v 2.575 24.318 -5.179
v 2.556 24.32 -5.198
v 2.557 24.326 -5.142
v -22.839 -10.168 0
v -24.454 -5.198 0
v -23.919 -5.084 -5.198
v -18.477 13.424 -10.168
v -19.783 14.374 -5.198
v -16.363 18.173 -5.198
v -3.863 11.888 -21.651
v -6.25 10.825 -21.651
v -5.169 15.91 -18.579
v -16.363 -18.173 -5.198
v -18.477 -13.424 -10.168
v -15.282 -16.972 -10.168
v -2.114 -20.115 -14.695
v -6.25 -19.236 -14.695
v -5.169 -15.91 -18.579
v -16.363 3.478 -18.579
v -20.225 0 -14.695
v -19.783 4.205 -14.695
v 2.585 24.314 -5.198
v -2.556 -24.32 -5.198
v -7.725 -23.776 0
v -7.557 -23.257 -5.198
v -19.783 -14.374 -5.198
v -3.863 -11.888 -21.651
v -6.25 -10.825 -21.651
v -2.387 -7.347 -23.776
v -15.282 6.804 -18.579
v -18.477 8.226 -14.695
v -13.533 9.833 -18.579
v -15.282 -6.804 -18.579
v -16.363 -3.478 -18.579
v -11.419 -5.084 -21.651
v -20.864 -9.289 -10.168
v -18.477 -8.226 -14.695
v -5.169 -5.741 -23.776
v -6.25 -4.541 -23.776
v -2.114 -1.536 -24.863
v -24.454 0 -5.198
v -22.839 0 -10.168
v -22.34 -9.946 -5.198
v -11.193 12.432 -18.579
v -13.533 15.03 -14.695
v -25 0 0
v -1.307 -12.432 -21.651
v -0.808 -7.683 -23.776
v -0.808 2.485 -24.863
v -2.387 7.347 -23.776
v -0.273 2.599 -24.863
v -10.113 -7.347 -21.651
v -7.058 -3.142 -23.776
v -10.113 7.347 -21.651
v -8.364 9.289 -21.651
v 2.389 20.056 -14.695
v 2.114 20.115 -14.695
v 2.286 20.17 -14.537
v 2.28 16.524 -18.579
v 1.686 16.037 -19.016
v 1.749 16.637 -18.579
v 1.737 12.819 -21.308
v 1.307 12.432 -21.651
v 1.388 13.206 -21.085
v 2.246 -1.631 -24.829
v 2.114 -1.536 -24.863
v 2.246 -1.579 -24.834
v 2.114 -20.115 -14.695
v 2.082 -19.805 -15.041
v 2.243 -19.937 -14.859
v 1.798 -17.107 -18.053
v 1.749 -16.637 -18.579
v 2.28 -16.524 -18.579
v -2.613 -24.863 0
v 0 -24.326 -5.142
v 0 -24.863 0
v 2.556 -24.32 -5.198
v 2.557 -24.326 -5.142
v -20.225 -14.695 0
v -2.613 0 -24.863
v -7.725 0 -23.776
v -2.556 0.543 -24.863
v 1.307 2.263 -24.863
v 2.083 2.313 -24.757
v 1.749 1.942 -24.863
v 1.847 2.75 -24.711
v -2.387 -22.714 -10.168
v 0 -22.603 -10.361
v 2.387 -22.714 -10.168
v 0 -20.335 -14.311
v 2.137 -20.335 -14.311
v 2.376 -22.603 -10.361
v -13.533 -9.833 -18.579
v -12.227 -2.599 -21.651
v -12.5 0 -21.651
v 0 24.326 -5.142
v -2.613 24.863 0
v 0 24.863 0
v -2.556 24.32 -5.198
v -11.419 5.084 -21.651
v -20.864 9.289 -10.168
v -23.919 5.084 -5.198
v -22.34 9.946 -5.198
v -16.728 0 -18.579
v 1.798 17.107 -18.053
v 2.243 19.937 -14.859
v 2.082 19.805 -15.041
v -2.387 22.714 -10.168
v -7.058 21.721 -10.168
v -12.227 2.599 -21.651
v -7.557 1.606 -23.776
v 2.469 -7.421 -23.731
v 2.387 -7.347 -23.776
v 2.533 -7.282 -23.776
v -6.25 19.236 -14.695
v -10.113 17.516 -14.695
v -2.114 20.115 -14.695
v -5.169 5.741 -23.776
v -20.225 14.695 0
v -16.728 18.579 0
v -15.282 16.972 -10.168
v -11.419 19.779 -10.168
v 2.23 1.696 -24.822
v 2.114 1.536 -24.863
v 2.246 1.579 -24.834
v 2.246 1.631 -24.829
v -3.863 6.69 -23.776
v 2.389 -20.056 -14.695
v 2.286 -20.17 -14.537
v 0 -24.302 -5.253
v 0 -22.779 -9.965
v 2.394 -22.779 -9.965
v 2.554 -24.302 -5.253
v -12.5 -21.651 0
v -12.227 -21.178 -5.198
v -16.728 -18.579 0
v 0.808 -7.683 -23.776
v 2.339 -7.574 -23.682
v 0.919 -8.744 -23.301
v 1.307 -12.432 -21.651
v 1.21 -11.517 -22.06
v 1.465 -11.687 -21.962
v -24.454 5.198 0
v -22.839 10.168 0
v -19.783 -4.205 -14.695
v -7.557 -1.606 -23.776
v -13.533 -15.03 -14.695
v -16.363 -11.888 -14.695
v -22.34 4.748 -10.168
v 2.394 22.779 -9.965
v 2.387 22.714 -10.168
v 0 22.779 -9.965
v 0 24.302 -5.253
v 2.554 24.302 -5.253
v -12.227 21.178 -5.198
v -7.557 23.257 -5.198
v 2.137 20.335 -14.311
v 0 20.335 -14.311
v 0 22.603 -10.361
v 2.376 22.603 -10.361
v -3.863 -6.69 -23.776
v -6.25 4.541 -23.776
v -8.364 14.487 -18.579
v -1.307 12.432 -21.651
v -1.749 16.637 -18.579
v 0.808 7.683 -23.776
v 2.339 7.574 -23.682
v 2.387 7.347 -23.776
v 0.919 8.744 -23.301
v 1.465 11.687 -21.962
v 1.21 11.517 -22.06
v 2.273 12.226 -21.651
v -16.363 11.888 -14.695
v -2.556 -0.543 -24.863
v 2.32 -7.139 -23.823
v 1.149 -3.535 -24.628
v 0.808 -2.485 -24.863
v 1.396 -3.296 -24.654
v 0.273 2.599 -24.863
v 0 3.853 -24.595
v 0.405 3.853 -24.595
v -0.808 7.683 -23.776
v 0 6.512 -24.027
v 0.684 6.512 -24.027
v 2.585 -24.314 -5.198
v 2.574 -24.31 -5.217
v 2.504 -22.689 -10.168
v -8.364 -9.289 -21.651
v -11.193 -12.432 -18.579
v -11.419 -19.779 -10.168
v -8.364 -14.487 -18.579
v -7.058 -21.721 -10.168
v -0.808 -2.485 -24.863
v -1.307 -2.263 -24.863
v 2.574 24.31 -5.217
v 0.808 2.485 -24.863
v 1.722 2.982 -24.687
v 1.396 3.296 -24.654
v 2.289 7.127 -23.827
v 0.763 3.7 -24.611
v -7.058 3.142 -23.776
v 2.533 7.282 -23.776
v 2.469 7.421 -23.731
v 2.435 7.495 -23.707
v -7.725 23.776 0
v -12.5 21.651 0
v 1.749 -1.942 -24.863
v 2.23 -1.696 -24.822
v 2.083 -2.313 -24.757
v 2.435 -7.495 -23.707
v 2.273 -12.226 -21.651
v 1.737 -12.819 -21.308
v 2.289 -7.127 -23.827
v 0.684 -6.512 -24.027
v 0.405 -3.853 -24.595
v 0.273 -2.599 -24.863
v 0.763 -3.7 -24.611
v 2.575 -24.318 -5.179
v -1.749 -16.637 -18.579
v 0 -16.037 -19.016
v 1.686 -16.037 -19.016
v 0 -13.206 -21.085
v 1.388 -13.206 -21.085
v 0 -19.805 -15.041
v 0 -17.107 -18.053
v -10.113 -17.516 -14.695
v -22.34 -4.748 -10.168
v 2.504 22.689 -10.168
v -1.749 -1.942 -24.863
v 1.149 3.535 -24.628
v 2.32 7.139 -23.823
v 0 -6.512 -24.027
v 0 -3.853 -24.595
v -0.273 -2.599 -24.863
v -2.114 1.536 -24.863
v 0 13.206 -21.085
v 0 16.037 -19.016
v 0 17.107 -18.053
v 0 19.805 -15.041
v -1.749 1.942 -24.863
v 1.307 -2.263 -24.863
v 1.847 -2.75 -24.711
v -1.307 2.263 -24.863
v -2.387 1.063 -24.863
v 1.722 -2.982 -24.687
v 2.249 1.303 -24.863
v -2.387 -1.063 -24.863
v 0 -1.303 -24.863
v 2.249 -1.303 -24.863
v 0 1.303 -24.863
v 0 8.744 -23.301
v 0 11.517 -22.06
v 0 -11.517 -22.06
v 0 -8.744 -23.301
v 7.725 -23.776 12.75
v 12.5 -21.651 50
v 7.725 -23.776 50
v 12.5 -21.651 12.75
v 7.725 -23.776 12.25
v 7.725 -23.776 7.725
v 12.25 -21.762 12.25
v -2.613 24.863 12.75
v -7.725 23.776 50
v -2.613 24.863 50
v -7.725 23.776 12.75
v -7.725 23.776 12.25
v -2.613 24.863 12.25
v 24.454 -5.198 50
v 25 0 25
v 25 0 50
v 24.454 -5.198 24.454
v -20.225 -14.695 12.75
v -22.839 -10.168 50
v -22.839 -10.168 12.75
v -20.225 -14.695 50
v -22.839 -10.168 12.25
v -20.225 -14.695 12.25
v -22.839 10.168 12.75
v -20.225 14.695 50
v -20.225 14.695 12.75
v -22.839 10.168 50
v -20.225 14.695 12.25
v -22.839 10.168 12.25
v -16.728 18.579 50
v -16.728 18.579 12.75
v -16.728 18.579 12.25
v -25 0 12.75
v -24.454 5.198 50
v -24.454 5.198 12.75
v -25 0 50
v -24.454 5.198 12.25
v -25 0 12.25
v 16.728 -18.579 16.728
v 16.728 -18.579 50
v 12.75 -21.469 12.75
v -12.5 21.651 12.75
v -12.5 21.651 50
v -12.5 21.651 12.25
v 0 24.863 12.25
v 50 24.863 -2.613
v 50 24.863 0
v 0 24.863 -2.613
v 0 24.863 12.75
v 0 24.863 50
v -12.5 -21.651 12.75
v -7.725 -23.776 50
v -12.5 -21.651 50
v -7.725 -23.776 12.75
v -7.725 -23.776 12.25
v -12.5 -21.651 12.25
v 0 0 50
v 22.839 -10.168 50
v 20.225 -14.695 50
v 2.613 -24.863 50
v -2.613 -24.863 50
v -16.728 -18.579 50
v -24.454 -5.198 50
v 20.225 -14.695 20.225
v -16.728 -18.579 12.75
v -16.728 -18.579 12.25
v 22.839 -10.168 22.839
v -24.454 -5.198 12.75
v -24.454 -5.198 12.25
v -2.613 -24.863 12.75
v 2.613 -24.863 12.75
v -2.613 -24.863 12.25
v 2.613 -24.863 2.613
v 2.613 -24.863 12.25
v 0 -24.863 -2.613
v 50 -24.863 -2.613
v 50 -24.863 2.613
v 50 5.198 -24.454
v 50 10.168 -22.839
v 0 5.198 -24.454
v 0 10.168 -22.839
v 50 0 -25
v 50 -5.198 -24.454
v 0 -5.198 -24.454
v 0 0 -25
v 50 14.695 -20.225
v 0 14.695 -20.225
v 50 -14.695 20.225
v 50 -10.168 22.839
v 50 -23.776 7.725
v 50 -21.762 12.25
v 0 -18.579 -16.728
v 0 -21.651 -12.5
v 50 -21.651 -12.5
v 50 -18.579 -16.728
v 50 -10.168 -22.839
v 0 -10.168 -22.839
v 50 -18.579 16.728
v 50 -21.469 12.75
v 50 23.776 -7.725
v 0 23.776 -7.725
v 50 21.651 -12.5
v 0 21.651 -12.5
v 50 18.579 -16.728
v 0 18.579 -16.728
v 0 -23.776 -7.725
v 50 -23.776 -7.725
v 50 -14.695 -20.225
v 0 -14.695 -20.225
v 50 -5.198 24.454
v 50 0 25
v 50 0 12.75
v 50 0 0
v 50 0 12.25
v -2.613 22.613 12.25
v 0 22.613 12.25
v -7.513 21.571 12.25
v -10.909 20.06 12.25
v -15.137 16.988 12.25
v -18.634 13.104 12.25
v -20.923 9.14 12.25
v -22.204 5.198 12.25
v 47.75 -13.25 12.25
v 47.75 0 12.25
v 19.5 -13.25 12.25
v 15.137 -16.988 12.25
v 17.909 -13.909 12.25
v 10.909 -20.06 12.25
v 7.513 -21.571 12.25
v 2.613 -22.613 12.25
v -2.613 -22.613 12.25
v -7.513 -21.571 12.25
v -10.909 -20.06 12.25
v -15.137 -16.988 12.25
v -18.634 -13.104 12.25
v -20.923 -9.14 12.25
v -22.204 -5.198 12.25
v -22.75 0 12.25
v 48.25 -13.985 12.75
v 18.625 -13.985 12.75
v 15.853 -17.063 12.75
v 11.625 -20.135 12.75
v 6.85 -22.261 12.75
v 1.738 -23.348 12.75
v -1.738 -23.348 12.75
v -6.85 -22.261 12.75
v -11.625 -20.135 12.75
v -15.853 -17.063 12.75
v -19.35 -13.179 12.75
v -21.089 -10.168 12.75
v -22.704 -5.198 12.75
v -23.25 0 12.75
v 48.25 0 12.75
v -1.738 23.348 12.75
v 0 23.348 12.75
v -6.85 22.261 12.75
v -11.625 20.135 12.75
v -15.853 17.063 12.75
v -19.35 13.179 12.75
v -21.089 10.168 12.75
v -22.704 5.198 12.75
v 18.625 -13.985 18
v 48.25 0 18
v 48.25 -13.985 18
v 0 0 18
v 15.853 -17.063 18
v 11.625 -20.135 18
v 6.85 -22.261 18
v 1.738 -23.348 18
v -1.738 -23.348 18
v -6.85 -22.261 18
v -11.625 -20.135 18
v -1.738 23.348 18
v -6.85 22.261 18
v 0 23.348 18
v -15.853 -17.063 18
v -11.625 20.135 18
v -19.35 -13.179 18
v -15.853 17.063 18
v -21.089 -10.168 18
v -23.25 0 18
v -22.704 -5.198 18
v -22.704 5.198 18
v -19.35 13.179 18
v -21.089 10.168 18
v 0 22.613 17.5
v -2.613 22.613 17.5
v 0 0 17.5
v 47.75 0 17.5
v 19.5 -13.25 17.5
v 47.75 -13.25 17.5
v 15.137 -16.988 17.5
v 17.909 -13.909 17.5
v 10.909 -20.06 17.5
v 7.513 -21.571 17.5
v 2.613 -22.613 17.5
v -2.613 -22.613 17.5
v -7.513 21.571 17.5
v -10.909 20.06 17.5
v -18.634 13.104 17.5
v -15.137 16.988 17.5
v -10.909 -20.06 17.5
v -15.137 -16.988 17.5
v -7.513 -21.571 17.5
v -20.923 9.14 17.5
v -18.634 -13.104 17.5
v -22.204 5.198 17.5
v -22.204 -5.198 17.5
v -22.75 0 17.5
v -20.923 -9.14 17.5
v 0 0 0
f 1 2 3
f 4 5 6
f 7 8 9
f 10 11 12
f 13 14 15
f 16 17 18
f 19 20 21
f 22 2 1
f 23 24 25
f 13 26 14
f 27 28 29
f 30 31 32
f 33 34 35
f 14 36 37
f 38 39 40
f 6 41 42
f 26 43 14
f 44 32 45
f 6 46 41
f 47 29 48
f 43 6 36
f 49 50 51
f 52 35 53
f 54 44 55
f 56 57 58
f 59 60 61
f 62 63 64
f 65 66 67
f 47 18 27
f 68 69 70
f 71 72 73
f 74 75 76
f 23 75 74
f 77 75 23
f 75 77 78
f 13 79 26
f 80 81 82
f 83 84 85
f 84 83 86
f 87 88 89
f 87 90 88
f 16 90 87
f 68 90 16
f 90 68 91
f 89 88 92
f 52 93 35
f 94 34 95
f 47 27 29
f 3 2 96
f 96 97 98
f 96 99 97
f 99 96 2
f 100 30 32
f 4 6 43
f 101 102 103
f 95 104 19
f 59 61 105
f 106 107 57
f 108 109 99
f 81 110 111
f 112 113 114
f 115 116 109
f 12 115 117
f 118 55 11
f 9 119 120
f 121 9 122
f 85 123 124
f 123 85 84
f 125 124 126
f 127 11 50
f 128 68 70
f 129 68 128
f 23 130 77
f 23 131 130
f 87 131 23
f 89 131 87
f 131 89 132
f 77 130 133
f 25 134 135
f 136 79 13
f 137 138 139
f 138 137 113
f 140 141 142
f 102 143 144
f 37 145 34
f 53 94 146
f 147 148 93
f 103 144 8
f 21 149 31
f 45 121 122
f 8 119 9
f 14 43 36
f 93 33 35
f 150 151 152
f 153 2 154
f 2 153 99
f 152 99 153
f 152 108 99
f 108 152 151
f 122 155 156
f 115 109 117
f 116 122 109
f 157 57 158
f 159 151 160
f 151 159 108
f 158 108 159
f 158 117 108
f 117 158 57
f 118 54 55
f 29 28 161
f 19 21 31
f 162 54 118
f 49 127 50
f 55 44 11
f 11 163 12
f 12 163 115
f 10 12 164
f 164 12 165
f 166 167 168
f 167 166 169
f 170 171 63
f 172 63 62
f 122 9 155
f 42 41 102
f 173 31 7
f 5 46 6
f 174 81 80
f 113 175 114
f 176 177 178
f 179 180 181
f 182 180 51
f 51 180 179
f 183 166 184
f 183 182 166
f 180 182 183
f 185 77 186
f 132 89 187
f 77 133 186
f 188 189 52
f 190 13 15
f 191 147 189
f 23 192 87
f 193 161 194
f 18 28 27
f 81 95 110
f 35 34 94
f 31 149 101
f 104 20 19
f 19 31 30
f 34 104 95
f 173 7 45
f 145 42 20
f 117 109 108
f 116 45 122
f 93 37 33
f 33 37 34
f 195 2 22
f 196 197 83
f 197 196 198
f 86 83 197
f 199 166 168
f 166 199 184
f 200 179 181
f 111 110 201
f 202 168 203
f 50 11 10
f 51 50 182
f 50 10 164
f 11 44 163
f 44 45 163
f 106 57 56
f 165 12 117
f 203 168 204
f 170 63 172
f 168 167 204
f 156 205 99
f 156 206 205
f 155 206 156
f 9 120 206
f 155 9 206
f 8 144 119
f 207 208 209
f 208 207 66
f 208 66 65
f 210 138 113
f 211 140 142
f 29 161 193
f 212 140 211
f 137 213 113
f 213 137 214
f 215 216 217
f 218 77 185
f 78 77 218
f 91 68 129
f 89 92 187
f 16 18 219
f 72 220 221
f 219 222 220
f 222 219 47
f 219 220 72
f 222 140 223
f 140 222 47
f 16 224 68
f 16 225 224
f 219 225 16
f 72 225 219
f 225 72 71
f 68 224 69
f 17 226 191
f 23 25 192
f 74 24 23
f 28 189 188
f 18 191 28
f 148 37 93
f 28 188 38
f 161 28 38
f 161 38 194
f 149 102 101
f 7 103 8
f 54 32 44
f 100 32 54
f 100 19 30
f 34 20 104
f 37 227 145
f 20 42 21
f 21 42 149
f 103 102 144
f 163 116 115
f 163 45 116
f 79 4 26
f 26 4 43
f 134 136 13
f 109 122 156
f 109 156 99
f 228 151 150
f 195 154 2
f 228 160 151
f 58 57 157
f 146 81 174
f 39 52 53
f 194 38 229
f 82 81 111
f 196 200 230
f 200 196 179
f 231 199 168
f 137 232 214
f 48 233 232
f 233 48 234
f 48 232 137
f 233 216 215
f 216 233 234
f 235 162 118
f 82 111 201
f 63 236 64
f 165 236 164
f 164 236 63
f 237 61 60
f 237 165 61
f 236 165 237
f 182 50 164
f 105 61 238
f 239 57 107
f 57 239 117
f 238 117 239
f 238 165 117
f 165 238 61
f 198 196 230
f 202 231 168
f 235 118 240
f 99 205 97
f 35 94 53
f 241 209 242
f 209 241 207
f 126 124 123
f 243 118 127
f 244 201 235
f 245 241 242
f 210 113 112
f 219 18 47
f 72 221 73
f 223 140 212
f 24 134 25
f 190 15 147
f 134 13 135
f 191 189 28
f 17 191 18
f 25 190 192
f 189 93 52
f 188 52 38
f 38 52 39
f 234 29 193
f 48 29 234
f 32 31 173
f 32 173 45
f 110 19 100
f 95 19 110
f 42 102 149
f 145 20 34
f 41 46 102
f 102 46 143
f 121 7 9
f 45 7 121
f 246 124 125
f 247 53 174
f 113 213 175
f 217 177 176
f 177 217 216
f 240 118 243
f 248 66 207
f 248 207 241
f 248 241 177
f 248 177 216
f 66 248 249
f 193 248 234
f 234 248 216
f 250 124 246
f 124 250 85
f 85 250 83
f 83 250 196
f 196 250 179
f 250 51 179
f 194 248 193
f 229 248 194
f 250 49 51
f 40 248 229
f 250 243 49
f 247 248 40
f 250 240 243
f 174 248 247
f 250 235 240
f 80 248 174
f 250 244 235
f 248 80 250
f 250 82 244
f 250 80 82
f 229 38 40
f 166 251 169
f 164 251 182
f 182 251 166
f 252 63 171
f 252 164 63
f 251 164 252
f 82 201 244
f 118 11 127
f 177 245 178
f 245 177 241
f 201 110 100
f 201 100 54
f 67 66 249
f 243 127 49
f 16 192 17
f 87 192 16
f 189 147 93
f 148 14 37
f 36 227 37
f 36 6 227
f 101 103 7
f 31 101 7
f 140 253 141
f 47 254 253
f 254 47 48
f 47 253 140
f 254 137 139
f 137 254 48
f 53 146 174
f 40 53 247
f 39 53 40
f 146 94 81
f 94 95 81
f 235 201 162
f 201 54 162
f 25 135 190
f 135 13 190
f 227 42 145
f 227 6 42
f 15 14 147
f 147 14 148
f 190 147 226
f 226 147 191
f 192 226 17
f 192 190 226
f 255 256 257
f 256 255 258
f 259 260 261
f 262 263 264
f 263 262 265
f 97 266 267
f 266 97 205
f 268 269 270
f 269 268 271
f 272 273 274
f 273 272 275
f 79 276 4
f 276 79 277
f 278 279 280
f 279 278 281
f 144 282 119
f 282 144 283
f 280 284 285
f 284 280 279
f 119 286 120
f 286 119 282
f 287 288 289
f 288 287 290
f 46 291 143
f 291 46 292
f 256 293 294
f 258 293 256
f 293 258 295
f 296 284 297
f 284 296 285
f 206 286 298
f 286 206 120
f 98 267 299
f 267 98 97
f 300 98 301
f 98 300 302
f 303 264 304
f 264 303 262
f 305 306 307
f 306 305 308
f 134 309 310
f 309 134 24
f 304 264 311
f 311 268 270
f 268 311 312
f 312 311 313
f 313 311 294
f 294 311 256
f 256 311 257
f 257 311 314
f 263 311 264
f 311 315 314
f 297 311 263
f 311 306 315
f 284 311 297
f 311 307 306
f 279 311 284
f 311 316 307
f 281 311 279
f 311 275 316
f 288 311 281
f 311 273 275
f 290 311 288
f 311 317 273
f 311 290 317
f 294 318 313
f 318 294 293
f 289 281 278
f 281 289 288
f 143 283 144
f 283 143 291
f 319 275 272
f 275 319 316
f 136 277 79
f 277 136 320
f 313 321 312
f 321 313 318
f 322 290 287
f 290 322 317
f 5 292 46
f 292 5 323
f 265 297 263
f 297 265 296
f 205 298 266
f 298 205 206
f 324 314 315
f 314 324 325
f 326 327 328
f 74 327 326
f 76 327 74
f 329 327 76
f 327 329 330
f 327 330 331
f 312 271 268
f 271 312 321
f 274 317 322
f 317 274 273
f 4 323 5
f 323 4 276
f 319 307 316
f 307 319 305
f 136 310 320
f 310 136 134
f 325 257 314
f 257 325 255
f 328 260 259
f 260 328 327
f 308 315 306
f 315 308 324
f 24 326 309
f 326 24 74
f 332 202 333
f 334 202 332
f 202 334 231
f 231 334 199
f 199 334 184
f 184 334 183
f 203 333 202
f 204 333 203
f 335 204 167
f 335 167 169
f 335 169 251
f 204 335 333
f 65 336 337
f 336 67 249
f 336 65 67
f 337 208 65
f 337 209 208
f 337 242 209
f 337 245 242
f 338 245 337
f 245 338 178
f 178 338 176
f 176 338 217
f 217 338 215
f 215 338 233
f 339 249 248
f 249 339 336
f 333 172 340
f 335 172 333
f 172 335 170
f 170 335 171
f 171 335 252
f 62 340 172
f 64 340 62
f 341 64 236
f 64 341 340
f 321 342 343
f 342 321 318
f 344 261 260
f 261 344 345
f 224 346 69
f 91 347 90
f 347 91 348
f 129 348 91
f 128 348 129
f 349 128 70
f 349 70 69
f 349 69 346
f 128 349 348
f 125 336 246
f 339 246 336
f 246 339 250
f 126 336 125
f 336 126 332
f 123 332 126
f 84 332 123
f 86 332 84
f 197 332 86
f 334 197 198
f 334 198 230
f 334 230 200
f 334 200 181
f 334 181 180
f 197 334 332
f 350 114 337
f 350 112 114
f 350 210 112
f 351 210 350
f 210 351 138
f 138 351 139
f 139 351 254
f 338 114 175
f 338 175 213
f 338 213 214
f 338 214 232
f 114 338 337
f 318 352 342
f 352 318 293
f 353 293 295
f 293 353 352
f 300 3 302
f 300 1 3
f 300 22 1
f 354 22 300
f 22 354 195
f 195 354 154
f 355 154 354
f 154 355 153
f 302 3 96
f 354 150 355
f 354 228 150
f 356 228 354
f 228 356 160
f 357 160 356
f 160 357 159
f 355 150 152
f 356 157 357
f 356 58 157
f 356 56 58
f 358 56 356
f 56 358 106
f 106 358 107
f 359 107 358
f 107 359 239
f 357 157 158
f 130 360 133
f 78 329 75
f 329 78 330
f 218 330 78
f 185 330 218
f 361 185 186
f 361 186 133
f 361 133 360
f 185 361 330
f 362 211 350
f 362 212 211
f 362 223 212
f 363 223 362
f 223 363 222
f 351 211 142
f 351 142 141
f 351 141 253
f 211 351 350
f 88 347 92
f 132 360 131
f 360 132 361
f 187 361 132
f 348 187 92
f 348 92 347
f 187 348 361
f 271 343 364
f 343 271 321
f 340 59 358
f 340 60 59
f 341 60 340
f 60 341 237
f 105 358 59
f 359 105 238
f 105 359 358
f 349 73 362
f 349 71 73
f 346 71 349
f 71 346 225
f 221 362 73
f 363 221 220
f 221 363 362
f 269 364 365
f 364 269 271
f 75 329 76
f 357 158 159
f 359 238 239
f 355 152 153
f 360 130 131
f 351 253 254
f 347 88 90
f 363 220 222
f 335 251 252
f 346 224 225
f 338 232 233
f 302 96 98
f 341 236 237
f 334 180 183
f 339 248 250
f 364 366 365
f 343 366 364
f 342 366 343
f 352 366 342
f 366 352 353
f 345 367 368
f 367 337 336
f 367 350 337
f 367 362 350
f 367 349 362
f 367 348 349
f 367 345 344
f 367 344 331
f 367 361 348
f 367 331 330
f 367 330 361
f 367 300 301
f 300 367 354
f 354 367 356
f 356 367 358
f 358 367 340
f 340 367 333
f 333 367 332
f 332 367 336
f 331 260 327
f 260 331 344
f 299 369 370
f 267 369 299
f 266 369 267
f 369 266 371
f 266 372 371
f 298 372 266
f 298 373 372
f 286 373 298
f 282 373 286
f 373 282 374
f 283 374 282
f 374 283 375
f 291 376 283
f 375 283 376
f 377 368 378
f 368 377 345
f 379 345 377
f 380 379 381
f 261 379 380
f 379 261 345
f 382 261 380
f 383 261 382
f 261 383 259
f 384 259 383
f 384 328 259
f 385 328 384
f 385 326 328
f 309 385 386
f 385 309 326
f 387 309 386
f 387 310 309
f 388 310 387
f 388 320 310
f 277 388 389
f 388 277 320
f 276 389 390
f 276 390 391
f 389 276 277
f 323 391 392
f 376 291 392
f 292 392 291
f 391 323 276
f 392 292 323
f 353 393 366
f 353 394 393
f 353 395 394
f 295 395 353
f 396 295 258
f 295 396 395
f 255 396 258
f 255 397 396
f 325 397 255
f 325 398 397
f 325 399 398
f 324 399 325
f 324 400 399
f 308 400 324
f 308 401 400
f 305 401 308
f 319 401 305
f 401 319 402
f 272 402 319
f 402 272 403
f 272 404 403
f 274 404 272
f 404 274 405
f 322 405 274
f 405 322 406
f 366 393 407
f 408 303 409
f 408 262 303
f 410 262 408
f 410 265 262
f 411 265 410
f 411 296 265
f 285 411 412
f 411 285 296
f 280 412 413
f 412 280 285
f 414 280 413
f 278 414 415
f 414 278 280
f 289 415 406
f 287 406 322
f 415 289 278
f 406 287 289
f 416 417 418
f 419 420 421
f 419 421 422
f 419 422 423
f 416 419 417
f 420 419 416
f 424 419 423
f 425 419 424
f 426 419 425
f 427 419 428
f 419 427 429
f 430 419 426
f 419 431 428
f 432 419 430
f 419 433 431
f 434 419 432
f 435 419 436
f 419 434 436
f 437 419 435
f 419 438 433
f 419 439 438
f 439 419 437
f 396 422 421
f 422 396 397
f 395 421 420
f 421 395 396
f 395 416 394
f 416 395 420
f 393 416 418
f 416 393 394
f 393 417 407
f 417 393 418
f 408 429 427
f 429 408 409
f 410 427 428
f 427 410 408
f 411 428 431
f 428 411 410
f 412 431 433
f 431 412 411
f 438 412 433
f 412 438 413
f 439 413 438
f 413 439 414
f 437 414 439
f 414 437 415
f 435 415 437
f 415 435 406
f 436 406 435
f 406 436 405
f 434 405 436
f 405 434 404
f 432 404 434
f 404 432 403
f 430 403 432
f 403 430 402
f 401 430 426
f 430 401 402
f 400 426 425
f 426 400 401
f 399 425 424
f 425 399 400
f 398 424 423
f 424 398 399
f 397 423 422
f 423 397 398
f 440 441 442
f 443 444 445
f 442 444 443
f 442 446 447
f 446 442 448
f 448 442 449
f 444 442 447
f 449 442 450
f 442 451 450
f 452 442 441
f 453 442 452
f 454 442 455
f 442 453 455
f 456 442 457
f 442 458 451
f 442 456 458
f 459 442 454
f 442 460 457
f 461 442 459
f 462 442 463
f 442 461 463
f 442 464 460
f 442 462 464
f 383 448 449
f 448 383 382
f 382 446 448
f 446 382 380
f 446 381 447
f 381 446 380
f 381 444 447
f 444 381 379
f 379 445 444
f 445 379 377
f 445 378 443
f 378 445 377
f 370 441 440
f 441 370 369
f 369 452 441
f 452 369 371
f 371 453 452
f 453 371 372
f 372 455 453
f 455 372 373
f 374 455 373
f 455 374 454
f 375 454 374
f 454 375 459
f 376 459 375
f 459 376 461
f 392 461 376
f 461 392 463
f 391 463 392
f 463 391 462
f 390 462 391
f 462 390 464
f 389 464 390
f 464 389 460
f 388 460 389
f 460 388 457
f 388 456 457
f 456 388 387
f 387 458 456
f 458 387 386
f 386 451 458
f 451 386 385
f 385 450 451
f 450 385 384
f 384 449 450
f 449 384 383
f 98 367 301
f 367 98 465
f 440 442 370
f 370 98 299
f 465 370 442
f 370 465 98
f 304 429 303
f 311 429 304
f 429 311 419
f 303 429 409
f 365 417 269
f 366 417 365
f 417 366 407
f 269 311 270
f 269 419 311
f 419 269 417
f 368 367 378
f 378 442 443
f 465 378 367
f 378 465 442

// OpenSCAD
// file: ../../m4.scad
/* m4.scad: Am OpenSCAD matrix transformation library.
 * See: http://app.cear.ufpb.br/~lucas.hartmann/2015/09/05/matrix-transformations-on-openscad/
 *
 * Originally by Lucas V. Hartmann <lhartmann@github.com>, 2016.
 * Dual licenced under Creative Commons Attribution-Share Alike 3.0 and LGPL2 or later
 */
 
function m4identity() = [
	[1, 0, 0, 0 ],
	[0, 1, 0, 0 ],
	[0, 0, 1, 0 ],
	[0, 0, 0, 1 ]
];

// Translation
function m4tr(d) = [
	[1, 0, 0, d[0] ],
	[0, 1, 0, d[1] ],
	[0, 0, 1, d[2] ],
	[0, 0, 0,  1   ]
];

// Rotation around X axis
function m4rx(a) = [
	[1, 0,       0,       0 ],
	[0, +cos(a), -sin(a), 0 ],
	[0, +sin(a), +cos(a), 0 ],
	[0, 0,       0,       1 ]
];

// Rotation around Y axis
function m4ry(a) = [
	[+cos(a), 0, +sin(a), 0 ],
	[0,       1, 0,       0 ],
	[-sin(a), 0, +cos(a), 0 ],
	[0,       0, 0,       1 ]
];

// Rotation around Z axis
function m4rz(a) = [
	[+cos(a), -sin(a), 0, 0 ],
	[+sin(a), +cos(a), 0, 0 ],
	[0,       0,       1, 0 ],
	[0,       0,       0, 1 ]
];

// Scale:
//   m4scale(2)              scales all dimensions equally
//   m4scale([sx, sy, sz])   scale each axis independently
//   m4scale([-1,  0,  0])   mirror over X axis / YZ plane
function m4scale(s) = 
	len(s) == undef ? [ 
		[s,    0,    0,    0],
		[0,    s,    0,    0],
		[0,    0,    s,    0],
		[0,    0,    0,    1]
	] : [
		[s[0], 0,    0,    0],
		[0,    s[1], 0,    0],
		[0,    0,    s[2], 0],
		[0,    0,    0,    1]
	];

// Extract only the rotation/scaling/mirroring submatrix
function m4rotm(m) = [
	[mx[0][0], mx[0][1], mx[0][2], 0],
	[mx[1][0], mx[1][1], mx[1][2], 0],
	[mx[2][0], mx[2][1], mx[2][2], 0],
	[       0,        0,        0, 1],
];

// Extract just the translation vector
function m4trv(m) = [m[0][3], m[1][3], m[2][3]];

// Aply transformation matrix to a single point
function m4_transform_point(m,p) = m4trv(m*m4tr(p));

// Matrix inversion, this code is a mess

// Expand matrix to 4x8 with identity: Row-reduced echelon format
function m4inv_mx(m) = [
	[m[0][0], m[0][1], m[0][2], m[0][3], 1, 0, 0, 0],
	[m[1][0], m[1][1], m[1][2], m[1][3], 0, 1, 0, 0],
	[m[2][0], m[2][1], m[2][2], m[2][3], 0, 0, 1, 0],
	[m[3][0], m[3][1], m[3][2], m[3][3], 0, 0, 0, 1]
];

// Swap rows to move zeros away from diagonal
function m4inv_rowswap(i,j,mx) = [
	i==0 ? mx[j] : j==0 ? mx[i] : mx[0],
	i==1 ? mx[j] : j==1 ? mx[i] : mx[1],
	i==2 ? mx[j] : j==2 ? mx[i] : mx[2],
	i==3 ? mx[j] : j==3 ? mx[i] : mx[3]
];

// Solve one step, direct solution, assume nonzero at diagonal
function m4inv_solve2(i,mx) = [
	(i==0) ? mx[i]/mx[i][i] : mx[0]-mx[i]*mx[0][i]/mx[i][i],
	(i==1) ? mx[i]/mx[i][i] : mx[1]-mx[i]*mx[1][i]/mx[i][i],
	(i==2) ? mx[i]/mx[i][i] : mx[2]-mx[i]*mx[2][i]/mx[i][i],
	(i==3) ? mx[i]/mx[i][i] : mx[3]-mx[i]*mx[3][i]/mx[i][i]
];

// Solve one step, ensure nonzero at diagonal element.
function m4inv_zero(x) = abs(x) < 1e-5;
function m4inv_solve(i,mx) = 
	         !m4inv_zero(mx[i  ][i]) ? m4inv_solve2(i,                     mx ) :
	i+1<4 && !m4inv_zero(mx[i+1][i]) ? m4inv_solve2(i, m4inv_rowswap(i,i+1,mx)) :
	i+2<4 && !m4inv_zero(mx[i+2][i]) ? m4inv_solve2(i, m4inv_rowswap(i,i+2,mx)) :
	i+3<4 && !m4inv_zero(mx[i+3][i]) ? m4inv_solve2(i, m4inv_rowswap(i,i+3,mx)) :
	m4identity(); // Singular matrix, reset to identity

// Get result from row-reduced echelon format
function m4inv_m(mx) = [
	[mx[0][4], mx[0][5], mx[0][6], mx[0][7]],
	[mx[1][4], mx[1][5], mx[1][6], mx[1][7]],
	[mx[2][4], mx[2][5], mx[2][6], mx[2][7]],
	[mx[3][4], mx[3][5], mx[3][6], mx[3][7]]
];

// Full matrix inversion using functions on top
function m4inv(m) = m4inv_m(m4inv_solve(3,m4inv_solve(2,m4inv_solve(1,m4inv_solve(0,m4inv_mx(m))))));
// file: ../../mortise_tenon.scad
/* mortise_tenon.scad: Creates mortise and tenon joints on arbitrarypoints of a model.
 *
 * Originally by Lucas V. Hartmann <lhartmann@github.com>, 2016.
 * Dual licenced under Creative Commons Attribution-Share Alike 3.0 and LGPL2 or later
 */

include <m4.scad>

module mortise_tenon(l=0, wall=1, clear=0, at=m4identity(), BIG=1000) {
	// Position the model, cut, return to original position.
    multmatrix(at) __mortise_tenon() multmatrix(m4inv(at)) children();

	// True functionality
	//  Cut plane at Z=0
	//  Tenon points to Z+
    module __mortise_tenon() {
        difference() {
            children();
            difference() {
                union() {
//                    cylinder(r=BIG, h=clear, center = true);
                    linear_extrude(height=clear, center=true) 
                        large_profile(clear) children();
                    linear_extrude(height=l+clear)
                        small_profile(wall-clear/2)
                        children();
                }
                linear_extrude(height=2*l, center=true)
                    small_profile(wall+clear/2)
                    children();
            }
        }
    }
    
    // Creates the cut profile, where the model separates.
    // r = how much to grow from the model.
    module large_profile(r=0) {
        minkowski() {
            projection(cut=true) children();
            circle(r=r);
        }
    }
    
    // Creates a reduced version of the baseprofile.
    // r = how much to shrink.
    module small_profile(r=0) {
        difference() {
            base_profile() children();
            minkowski() {
                difference() {
                    minkowski() {
                        base_profile() children();
                        circle();
                    }
                    base_profile() children();
                }
                circle(r=r);
            }
        }
    }
    
    // Finds out where in the model it is safe to create a joint.
    // This requires the model to be solid for Z in [-wall, l+wall]
    module base_profile() {
        difference() {
            projection(cut=false) children();
            projection(cut=false) difference() {
                translate([0,0,-wall]) cylinder(d=BIG, h=l+2*wall);
                children();
            }
        }
    }
}
// main file
/* mortise_tenon_demo.scad: Creates mortise and tenon joints on arbitrarypoints of a model.
 *
 * Originally by Lucas V. Hartmann <lhartmann@github.com>, 2016.
 * Dual licenced under Creative Commons Attribution-Share Alike 3.0 and LGPL2 or later
 */

include <../../mortise_tenon.scad>

mortise_tenon_demo();
module mortise_tenon_demo() {
    BIG=1000;
    t = $t;

//    intersection() {
    difference() {
        mortise_tenon(5, 2, 0.5, m4tr([12.5,0,12.5])*m4ry(t*360)) 
            rotate([t, 2*t, 3*t]*360) {
                sphere(r=25);
                cylinder(r=25, h=50);
                rotate([0,90,0]) 
                    cylinder(r=25, h=50);
            }
        
        // Slice the object so you can see the mortise-tennon joint.
        cube([100,100,100]);
//        rotate([-90,0,0])
//            cylinder(r=1000, h=1000);
    }
}
